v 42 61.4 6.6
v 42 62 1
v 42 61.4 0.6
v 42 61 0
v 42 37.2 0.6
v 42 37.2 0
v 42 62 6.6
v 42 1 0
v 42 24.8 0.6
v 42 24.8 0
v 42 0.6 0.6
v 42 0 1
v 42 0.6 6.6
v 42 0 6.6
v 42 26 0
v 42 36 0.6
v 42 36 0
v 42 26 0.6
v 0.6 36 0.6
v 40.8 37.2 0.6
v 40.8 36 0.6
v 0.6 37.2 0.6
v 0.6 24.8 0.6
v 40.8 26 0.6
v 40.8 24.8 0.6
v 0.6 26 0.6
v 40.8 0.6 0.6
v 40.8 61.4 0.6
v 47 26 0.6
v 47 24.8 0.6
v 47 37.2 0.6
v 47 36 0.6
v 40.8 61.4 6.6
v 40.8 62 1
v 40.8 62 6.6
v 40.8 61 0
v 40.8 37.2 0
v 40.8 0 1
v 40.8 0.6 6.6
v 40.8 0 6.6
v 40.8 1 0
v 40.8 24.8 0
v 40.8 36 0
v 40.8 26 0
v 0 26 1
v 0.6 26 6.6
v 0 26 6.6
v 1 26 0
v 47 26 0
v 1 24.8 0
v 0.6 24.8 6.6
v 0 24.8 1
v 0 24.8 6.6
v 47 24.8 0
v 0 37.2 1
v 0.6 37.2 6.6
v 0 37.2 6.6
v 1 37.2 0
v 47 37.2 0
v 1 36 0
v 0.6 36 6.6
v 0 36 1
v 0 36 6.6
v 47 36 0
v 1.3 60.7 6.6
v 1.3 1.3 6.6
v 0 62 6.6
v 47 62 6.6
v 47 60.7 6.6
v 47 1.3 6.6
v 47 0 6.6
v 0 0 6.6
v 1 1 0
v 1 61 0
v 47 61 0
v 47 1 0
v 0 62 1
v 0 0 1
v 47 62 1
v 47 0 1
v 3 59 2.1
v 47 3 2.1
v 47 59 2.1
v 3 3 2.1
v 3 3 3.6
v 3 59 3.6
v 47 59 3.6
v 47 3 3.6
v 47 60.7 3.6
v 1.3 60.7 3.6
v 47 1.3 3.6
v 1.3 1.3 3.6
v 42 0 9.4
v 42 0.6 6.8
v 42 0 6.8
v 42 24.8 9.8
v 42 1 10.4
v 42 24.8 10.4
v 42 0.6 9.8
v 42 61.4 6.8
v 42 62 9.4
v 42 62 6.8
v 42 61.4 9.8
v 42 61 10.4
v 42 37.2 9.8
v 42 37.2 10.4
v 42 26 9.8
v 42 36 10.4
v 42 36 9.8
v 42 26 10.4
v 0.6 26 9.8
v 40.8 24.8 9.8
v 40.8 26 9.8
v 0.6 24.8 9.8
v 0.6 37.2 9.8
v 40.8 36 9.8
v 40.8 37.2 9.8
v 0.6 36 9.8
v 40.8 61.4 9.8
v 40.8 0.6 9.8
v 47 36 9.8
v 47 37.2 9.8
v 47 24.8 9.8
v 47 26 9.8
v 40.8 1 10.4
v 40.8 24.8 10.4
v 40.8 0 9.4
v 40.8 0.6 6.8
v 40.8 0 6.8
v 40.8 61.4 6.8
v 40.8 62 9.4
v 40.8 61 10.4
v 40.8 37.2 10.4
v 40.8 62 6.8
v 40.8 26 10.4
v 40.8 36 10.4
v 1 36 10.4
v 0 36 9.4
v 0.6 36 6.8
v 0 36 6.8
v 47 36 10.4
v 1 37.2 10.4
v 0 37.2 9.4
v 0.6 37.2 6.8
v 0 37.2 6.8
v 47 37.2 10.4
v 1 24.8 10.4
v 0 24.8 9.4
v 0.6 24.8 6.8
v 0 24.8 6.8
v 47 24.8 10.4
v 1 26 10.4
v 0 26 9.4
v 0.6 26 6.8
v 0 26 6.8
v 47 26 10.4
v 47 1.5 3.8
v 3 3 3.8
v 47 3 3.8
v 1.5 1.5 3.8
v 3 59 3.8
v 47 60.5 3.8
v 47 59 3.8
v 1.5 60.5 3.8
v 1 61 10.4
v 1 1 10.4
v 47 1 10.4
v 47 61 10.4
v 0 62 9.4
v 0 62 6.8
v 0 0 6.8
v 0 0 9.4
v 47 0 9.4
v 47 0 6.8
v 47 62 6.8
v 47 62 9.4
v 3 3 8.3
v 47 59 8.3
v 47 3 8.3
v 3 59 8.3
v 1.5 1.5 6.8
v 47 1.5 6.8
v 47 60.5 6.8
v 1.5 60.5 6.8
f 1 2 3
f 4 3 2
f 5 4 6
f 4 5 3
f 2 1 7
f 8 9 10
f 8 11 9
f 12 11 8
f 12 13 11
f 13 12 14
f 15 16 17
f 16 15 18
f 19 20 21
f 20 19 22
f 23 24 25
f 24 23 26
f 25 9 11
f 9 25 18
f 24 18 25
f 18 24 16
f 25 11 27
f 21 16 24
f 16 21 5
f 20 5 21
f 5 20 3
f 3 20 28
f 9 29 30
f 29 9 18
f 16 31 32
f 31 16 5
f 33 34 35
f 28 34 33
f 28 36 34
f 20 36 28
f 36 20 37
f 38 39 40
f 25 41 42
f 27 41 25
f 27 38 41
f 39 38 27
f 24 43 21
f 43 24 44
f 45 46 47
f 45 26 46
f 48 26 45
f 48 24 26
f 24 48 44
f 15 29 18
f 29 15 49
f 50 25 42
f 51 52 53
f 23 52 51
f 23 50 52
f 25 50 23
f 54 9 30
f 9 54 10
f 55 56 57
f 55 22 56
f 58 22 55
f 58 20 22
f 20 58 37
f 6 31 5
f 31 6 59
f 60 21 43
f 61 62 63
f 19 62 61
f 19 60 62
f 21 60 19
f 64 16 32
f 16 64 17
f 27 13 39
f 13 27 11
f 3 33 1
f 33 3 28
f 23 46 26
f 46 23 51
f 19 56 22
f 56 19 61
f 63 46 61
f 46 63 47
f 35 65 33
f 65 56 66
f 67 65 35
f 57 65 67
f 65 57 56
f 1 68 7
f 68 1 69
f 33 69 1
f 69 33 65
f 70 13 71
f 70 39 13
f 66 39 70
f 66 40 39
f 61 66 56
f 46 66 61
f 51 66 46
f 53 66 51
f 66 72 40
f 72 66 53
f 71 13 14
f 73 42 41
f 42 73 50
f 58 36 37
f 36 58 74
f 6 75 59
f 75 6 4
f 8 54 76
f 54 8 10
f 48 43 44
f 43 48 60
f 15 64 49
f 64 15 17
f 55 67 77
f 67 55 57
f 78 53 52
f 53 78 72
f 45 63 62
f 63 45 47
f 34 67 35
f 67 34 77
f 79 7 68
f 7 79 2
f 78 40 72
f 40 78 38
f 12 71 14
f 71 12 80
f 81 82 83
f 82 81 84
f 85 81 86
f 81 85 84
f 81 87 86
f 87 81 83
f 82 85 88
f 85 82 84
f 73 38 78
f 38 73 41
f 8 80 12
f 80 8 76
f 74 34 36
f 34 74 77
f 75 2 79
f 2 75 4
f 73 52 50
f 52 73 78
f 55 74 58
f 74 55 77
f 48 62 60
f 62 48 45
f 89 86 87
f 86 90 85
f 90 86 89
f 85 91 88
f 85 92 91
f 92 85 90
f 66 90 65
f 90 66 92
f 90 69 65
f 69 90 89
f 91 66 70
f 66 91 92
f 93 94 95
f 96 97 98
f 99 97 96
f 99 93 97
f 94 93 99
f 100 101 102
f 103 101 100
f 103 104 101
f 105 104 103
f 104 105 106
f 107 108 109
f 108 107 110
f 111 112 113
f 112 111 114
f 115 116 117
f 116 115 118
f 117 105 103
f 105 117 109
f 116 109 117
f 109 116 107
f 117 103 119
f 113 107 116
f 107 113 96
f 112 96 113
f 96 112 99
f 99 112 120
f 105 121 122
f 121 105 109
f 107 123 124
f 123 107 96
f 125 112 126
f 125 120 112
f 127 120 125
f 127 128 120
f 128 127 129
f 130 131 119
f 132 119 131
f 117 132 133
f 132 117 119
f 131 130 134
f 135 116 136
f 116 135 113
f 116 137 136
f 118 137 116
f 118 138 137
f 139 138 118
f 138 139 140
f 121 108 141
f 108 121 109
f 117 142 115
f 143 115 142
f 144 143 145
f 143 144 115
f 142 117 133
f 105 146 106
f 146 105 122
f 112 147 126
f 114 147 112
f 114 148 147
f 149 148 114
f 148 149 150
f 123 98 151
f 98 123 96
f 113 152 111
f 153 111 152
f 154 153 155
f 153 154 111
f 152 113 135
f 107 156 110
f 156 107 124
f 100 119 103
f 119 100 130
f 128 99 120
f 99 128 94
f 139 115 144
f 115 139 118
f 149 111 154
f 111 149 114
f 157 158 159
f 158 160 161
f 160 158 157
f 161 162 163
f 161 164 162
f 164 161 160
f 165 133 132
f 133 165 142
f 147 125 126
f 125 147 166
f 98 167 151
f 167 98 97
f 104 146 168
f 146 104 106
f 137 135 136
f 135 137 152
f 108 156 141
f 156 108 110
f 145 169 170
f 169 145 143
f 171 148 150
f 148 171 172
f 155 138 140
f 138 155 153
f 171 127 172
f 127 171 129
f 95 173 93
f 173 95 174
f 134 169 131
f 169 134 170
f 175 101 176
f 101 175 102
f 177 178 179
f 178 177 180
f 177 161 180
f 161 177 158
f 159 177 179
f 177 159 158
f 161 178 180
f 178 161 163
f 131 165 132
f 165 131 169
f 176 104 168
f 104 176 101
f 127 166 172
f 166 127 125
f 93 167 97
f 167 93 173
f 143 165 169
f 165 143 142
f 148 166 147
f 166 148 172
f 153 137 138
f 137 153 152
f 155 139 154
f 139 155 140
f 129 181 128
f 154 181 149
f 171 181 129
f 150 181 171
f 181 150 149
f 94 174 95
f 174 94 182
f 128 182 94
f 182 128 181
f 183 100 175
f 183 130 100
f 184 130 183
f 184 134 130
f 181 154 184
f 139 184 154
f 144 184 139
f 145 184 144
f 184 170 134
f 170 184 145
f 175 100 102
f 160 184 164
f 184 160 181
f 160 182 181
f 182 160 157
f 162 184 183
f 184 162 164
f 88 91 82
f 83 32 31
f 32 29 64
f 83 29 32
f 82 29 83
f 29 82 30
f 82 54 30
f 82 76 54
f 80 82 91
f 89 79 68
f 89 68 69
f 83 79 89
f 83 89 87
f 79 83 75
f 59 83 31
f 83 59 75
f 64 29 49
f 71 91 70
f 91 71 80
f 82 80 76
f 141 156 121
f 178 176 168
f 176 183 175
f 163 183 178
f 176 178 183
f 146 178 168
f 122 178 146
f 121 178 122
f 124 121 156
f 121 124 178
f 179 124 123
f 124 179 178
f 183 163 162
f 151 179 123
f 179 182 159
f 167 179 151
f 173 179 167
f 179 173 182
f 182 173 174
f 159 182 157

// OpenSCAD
// Simple gift box consisting of upper and lower part
// Possible outputs (see end of file):
// * printArrangement(): upper and lower part next to each other in print orientation (default)
// * lowerBox(): bottom part of the box
// * upperBox(): top part of the box
// * assembledTestCut(): showing how parts would look stacked together (cut in the middle to inspect interface)
// * assembledTest(): showing how parts would look stacked together

// inner dimensions of the box
// Example dimensions:
// * credit card: 88x56x6
// * Steam gift card (in germany): 135x88x6
// * Box holding a few of my dice: 70x40x25
innerWidth = 88;
innerDepth = 56;
innerHeight = 6;

// How much of the innerHeight should be dedicated to holding the two pieces together
// value is in percent (0.0 - 1.0)
// Recommendations:
// * flat boxes: 0.5 (credit cards, etc.)
// * higher boxes: 0.1 - 0.2
overlapPercent = 0.5;

// thickness of the perimeter walls (half of that for interface between top and bottom)
wallThickness = 3.0;

// thickness of top and bottom solid faces
topBottomThickness = 2.1;

// how far diagonal edges cut into walls
edgeCut = 1;

// width and depth of the "gift wrap" marks that are inset into the surfaces
giftWrapMarkWidth = 1.2;
giftWrapMarkDepth = 0.6;

// total width of each piece of gift wrap
giftWrapWidth = 0.2 * min(innerWidth, innerDepth);

// At which height (relative to the box size) the seam separating
// upper and lower part should be placed
seamRelativeZ = 0.75;

overlapWallThickness = wallThickness * 0.5;
overlapTolerance = 0.2;


// purely computed values, should not be necessary to touch these
absoluteOverlap = overlapPercent * innerHeight;
lowerHeight = innerHeight * seamRelativeZ;
upperHeight = innerHeight * (1 - seamRelativeZ) + absoluteOverlap;
edgeCutterSize = 3 * max(innerWidth, innerDepth, innerHeight);

module lowerBox() {
    difference() {
        baseShape(innerWidth, innerDepth, lowerHeight);
        
        translate([overlapWallThickness - overlapTolerance, overlapWallThickness - overlapTolerance, lowerHeight + topBottomThickness - absoluteOverlap])
        cube([innerWidth + 2 * (overlapWallThickness + overlapTolerance), innerDepth + 2 * (overlapWallThickness + overlapTolerance), absoluteOverlap + 0.01]);
    }
}

module upperBox() {
    difference() {
        baseShape(innerWidth, innerDepth, upperHeight);
        
        translate([0, 0, upperHeight + topBottomThickness - absoluteOverlap])
        difference() {
            translate([-0.01, -0.01, 0])
            cube([innerWidth + 2 * wallThickness + 0.02, innerDepth + 2 * wallThickness + 0.02, absoluteOverlap + 0.01]);
            
            translate([overlapWallThickness, overlapWallThickness, -0.01])
            cube([innerWidth + 2 * overlapWallThickness, innerDepth + 2 * overlapWallThickness, absoluteOverlap + 0.03]);
        }
    }
}

module baseShape(w, d, h) {
    difference() {
        cube([w + 2 * wallThickness, d + 2 * wallThickness, h + topBottomThickness]);
        
        translate([wallThickness, wallThickness, topBottomThickness])
        cube([w, d, h + 0.01]);
        
        translate([0, edgeCut, 0])
        edgeCutter(45, 0);
        
        translate([0, d + 2 * wallThickness - edgeCut, 0])
        edgeCutter(45, 180);
        
        translate([edgeCut, 0, 0])
        edgeCutter(45, -90);
        
        translate([w + 2 * wallThickness - edgeCut, 0, 0])
        edgeCutter(45, 90);
        
        translate([wallThickness + innerWidth / 2, 0, 0])
        giftWrap();
        
        translate([0, wallThickness + innerDepth / 2, 0])
        rotate([0, 0, 90])
        giftWrap();
        
        translate([wallThickness + innerWidth / 2, 0, 0])
        rotate([-90, 0, 0])
        giftWrap();
        
        translate([wallThickness + innerWidth / 2, innerDepth + 2 * wallThickness, 0])
        rotate([90, 0, 0])
        giftWrap();
        
        translate([0, wallThickness + innerDepth / 2, 0])
        rotate([90, 0, 90])
        giftWrap();
        
        translate([innerWidth + 2 * wallThickness, wallThickness + innerDepth / 2, 0])
        rotate([-90, 0, 90])
        giftWrap();
    }
}

module edgeCutter(rx, rz) {
    rotate([rx, 0, rz])
    translate([-edgeCutterSize / 2, -edgeCutterSize, -edgeCutterSize / 2])
    cube(edgeCutterSize);
}

module giftWrap() {
    translate([-(giftWrapWidth + giftWrapMarkWidth) / 2, -edgeCutterSize / 2, -0.01])
    cube([giftWrapMarkWidth, edgeCutterSize, giftWrapMarkDepth + 0.01]);
    
    translate([(giftWrapWidth - giftWrapMarkWidth) / 2, -edgeCutterSize / 2, -0.01])
    cube([giftWrapMarkWidth, edgeCutterSize, giftWrapMarkDepth + 0.01]);
}

module assembledTest() {
    lowerBox();
    
    translate([0, innerDepth + 2 * wallThickness, innerHeight + 2 * topBottomThickness + overlapTolerance])
    rotate([180, 0, 0])
    upperBox();
}

module assembledTestCut() {
    difference() {
        assembledTest();
        
        translate([wallThickness + innerWidth / 2, -0.01, -0.01])
        cube([innerWidth, innerDepth * 4, innerHeight * 4]);
    }
}

module printArrangement() {
    lowerBox();
    
    translate([0, innerDepth + 4 * wallThickness, 0])
    upperBox();
}

assembledTestCut();
